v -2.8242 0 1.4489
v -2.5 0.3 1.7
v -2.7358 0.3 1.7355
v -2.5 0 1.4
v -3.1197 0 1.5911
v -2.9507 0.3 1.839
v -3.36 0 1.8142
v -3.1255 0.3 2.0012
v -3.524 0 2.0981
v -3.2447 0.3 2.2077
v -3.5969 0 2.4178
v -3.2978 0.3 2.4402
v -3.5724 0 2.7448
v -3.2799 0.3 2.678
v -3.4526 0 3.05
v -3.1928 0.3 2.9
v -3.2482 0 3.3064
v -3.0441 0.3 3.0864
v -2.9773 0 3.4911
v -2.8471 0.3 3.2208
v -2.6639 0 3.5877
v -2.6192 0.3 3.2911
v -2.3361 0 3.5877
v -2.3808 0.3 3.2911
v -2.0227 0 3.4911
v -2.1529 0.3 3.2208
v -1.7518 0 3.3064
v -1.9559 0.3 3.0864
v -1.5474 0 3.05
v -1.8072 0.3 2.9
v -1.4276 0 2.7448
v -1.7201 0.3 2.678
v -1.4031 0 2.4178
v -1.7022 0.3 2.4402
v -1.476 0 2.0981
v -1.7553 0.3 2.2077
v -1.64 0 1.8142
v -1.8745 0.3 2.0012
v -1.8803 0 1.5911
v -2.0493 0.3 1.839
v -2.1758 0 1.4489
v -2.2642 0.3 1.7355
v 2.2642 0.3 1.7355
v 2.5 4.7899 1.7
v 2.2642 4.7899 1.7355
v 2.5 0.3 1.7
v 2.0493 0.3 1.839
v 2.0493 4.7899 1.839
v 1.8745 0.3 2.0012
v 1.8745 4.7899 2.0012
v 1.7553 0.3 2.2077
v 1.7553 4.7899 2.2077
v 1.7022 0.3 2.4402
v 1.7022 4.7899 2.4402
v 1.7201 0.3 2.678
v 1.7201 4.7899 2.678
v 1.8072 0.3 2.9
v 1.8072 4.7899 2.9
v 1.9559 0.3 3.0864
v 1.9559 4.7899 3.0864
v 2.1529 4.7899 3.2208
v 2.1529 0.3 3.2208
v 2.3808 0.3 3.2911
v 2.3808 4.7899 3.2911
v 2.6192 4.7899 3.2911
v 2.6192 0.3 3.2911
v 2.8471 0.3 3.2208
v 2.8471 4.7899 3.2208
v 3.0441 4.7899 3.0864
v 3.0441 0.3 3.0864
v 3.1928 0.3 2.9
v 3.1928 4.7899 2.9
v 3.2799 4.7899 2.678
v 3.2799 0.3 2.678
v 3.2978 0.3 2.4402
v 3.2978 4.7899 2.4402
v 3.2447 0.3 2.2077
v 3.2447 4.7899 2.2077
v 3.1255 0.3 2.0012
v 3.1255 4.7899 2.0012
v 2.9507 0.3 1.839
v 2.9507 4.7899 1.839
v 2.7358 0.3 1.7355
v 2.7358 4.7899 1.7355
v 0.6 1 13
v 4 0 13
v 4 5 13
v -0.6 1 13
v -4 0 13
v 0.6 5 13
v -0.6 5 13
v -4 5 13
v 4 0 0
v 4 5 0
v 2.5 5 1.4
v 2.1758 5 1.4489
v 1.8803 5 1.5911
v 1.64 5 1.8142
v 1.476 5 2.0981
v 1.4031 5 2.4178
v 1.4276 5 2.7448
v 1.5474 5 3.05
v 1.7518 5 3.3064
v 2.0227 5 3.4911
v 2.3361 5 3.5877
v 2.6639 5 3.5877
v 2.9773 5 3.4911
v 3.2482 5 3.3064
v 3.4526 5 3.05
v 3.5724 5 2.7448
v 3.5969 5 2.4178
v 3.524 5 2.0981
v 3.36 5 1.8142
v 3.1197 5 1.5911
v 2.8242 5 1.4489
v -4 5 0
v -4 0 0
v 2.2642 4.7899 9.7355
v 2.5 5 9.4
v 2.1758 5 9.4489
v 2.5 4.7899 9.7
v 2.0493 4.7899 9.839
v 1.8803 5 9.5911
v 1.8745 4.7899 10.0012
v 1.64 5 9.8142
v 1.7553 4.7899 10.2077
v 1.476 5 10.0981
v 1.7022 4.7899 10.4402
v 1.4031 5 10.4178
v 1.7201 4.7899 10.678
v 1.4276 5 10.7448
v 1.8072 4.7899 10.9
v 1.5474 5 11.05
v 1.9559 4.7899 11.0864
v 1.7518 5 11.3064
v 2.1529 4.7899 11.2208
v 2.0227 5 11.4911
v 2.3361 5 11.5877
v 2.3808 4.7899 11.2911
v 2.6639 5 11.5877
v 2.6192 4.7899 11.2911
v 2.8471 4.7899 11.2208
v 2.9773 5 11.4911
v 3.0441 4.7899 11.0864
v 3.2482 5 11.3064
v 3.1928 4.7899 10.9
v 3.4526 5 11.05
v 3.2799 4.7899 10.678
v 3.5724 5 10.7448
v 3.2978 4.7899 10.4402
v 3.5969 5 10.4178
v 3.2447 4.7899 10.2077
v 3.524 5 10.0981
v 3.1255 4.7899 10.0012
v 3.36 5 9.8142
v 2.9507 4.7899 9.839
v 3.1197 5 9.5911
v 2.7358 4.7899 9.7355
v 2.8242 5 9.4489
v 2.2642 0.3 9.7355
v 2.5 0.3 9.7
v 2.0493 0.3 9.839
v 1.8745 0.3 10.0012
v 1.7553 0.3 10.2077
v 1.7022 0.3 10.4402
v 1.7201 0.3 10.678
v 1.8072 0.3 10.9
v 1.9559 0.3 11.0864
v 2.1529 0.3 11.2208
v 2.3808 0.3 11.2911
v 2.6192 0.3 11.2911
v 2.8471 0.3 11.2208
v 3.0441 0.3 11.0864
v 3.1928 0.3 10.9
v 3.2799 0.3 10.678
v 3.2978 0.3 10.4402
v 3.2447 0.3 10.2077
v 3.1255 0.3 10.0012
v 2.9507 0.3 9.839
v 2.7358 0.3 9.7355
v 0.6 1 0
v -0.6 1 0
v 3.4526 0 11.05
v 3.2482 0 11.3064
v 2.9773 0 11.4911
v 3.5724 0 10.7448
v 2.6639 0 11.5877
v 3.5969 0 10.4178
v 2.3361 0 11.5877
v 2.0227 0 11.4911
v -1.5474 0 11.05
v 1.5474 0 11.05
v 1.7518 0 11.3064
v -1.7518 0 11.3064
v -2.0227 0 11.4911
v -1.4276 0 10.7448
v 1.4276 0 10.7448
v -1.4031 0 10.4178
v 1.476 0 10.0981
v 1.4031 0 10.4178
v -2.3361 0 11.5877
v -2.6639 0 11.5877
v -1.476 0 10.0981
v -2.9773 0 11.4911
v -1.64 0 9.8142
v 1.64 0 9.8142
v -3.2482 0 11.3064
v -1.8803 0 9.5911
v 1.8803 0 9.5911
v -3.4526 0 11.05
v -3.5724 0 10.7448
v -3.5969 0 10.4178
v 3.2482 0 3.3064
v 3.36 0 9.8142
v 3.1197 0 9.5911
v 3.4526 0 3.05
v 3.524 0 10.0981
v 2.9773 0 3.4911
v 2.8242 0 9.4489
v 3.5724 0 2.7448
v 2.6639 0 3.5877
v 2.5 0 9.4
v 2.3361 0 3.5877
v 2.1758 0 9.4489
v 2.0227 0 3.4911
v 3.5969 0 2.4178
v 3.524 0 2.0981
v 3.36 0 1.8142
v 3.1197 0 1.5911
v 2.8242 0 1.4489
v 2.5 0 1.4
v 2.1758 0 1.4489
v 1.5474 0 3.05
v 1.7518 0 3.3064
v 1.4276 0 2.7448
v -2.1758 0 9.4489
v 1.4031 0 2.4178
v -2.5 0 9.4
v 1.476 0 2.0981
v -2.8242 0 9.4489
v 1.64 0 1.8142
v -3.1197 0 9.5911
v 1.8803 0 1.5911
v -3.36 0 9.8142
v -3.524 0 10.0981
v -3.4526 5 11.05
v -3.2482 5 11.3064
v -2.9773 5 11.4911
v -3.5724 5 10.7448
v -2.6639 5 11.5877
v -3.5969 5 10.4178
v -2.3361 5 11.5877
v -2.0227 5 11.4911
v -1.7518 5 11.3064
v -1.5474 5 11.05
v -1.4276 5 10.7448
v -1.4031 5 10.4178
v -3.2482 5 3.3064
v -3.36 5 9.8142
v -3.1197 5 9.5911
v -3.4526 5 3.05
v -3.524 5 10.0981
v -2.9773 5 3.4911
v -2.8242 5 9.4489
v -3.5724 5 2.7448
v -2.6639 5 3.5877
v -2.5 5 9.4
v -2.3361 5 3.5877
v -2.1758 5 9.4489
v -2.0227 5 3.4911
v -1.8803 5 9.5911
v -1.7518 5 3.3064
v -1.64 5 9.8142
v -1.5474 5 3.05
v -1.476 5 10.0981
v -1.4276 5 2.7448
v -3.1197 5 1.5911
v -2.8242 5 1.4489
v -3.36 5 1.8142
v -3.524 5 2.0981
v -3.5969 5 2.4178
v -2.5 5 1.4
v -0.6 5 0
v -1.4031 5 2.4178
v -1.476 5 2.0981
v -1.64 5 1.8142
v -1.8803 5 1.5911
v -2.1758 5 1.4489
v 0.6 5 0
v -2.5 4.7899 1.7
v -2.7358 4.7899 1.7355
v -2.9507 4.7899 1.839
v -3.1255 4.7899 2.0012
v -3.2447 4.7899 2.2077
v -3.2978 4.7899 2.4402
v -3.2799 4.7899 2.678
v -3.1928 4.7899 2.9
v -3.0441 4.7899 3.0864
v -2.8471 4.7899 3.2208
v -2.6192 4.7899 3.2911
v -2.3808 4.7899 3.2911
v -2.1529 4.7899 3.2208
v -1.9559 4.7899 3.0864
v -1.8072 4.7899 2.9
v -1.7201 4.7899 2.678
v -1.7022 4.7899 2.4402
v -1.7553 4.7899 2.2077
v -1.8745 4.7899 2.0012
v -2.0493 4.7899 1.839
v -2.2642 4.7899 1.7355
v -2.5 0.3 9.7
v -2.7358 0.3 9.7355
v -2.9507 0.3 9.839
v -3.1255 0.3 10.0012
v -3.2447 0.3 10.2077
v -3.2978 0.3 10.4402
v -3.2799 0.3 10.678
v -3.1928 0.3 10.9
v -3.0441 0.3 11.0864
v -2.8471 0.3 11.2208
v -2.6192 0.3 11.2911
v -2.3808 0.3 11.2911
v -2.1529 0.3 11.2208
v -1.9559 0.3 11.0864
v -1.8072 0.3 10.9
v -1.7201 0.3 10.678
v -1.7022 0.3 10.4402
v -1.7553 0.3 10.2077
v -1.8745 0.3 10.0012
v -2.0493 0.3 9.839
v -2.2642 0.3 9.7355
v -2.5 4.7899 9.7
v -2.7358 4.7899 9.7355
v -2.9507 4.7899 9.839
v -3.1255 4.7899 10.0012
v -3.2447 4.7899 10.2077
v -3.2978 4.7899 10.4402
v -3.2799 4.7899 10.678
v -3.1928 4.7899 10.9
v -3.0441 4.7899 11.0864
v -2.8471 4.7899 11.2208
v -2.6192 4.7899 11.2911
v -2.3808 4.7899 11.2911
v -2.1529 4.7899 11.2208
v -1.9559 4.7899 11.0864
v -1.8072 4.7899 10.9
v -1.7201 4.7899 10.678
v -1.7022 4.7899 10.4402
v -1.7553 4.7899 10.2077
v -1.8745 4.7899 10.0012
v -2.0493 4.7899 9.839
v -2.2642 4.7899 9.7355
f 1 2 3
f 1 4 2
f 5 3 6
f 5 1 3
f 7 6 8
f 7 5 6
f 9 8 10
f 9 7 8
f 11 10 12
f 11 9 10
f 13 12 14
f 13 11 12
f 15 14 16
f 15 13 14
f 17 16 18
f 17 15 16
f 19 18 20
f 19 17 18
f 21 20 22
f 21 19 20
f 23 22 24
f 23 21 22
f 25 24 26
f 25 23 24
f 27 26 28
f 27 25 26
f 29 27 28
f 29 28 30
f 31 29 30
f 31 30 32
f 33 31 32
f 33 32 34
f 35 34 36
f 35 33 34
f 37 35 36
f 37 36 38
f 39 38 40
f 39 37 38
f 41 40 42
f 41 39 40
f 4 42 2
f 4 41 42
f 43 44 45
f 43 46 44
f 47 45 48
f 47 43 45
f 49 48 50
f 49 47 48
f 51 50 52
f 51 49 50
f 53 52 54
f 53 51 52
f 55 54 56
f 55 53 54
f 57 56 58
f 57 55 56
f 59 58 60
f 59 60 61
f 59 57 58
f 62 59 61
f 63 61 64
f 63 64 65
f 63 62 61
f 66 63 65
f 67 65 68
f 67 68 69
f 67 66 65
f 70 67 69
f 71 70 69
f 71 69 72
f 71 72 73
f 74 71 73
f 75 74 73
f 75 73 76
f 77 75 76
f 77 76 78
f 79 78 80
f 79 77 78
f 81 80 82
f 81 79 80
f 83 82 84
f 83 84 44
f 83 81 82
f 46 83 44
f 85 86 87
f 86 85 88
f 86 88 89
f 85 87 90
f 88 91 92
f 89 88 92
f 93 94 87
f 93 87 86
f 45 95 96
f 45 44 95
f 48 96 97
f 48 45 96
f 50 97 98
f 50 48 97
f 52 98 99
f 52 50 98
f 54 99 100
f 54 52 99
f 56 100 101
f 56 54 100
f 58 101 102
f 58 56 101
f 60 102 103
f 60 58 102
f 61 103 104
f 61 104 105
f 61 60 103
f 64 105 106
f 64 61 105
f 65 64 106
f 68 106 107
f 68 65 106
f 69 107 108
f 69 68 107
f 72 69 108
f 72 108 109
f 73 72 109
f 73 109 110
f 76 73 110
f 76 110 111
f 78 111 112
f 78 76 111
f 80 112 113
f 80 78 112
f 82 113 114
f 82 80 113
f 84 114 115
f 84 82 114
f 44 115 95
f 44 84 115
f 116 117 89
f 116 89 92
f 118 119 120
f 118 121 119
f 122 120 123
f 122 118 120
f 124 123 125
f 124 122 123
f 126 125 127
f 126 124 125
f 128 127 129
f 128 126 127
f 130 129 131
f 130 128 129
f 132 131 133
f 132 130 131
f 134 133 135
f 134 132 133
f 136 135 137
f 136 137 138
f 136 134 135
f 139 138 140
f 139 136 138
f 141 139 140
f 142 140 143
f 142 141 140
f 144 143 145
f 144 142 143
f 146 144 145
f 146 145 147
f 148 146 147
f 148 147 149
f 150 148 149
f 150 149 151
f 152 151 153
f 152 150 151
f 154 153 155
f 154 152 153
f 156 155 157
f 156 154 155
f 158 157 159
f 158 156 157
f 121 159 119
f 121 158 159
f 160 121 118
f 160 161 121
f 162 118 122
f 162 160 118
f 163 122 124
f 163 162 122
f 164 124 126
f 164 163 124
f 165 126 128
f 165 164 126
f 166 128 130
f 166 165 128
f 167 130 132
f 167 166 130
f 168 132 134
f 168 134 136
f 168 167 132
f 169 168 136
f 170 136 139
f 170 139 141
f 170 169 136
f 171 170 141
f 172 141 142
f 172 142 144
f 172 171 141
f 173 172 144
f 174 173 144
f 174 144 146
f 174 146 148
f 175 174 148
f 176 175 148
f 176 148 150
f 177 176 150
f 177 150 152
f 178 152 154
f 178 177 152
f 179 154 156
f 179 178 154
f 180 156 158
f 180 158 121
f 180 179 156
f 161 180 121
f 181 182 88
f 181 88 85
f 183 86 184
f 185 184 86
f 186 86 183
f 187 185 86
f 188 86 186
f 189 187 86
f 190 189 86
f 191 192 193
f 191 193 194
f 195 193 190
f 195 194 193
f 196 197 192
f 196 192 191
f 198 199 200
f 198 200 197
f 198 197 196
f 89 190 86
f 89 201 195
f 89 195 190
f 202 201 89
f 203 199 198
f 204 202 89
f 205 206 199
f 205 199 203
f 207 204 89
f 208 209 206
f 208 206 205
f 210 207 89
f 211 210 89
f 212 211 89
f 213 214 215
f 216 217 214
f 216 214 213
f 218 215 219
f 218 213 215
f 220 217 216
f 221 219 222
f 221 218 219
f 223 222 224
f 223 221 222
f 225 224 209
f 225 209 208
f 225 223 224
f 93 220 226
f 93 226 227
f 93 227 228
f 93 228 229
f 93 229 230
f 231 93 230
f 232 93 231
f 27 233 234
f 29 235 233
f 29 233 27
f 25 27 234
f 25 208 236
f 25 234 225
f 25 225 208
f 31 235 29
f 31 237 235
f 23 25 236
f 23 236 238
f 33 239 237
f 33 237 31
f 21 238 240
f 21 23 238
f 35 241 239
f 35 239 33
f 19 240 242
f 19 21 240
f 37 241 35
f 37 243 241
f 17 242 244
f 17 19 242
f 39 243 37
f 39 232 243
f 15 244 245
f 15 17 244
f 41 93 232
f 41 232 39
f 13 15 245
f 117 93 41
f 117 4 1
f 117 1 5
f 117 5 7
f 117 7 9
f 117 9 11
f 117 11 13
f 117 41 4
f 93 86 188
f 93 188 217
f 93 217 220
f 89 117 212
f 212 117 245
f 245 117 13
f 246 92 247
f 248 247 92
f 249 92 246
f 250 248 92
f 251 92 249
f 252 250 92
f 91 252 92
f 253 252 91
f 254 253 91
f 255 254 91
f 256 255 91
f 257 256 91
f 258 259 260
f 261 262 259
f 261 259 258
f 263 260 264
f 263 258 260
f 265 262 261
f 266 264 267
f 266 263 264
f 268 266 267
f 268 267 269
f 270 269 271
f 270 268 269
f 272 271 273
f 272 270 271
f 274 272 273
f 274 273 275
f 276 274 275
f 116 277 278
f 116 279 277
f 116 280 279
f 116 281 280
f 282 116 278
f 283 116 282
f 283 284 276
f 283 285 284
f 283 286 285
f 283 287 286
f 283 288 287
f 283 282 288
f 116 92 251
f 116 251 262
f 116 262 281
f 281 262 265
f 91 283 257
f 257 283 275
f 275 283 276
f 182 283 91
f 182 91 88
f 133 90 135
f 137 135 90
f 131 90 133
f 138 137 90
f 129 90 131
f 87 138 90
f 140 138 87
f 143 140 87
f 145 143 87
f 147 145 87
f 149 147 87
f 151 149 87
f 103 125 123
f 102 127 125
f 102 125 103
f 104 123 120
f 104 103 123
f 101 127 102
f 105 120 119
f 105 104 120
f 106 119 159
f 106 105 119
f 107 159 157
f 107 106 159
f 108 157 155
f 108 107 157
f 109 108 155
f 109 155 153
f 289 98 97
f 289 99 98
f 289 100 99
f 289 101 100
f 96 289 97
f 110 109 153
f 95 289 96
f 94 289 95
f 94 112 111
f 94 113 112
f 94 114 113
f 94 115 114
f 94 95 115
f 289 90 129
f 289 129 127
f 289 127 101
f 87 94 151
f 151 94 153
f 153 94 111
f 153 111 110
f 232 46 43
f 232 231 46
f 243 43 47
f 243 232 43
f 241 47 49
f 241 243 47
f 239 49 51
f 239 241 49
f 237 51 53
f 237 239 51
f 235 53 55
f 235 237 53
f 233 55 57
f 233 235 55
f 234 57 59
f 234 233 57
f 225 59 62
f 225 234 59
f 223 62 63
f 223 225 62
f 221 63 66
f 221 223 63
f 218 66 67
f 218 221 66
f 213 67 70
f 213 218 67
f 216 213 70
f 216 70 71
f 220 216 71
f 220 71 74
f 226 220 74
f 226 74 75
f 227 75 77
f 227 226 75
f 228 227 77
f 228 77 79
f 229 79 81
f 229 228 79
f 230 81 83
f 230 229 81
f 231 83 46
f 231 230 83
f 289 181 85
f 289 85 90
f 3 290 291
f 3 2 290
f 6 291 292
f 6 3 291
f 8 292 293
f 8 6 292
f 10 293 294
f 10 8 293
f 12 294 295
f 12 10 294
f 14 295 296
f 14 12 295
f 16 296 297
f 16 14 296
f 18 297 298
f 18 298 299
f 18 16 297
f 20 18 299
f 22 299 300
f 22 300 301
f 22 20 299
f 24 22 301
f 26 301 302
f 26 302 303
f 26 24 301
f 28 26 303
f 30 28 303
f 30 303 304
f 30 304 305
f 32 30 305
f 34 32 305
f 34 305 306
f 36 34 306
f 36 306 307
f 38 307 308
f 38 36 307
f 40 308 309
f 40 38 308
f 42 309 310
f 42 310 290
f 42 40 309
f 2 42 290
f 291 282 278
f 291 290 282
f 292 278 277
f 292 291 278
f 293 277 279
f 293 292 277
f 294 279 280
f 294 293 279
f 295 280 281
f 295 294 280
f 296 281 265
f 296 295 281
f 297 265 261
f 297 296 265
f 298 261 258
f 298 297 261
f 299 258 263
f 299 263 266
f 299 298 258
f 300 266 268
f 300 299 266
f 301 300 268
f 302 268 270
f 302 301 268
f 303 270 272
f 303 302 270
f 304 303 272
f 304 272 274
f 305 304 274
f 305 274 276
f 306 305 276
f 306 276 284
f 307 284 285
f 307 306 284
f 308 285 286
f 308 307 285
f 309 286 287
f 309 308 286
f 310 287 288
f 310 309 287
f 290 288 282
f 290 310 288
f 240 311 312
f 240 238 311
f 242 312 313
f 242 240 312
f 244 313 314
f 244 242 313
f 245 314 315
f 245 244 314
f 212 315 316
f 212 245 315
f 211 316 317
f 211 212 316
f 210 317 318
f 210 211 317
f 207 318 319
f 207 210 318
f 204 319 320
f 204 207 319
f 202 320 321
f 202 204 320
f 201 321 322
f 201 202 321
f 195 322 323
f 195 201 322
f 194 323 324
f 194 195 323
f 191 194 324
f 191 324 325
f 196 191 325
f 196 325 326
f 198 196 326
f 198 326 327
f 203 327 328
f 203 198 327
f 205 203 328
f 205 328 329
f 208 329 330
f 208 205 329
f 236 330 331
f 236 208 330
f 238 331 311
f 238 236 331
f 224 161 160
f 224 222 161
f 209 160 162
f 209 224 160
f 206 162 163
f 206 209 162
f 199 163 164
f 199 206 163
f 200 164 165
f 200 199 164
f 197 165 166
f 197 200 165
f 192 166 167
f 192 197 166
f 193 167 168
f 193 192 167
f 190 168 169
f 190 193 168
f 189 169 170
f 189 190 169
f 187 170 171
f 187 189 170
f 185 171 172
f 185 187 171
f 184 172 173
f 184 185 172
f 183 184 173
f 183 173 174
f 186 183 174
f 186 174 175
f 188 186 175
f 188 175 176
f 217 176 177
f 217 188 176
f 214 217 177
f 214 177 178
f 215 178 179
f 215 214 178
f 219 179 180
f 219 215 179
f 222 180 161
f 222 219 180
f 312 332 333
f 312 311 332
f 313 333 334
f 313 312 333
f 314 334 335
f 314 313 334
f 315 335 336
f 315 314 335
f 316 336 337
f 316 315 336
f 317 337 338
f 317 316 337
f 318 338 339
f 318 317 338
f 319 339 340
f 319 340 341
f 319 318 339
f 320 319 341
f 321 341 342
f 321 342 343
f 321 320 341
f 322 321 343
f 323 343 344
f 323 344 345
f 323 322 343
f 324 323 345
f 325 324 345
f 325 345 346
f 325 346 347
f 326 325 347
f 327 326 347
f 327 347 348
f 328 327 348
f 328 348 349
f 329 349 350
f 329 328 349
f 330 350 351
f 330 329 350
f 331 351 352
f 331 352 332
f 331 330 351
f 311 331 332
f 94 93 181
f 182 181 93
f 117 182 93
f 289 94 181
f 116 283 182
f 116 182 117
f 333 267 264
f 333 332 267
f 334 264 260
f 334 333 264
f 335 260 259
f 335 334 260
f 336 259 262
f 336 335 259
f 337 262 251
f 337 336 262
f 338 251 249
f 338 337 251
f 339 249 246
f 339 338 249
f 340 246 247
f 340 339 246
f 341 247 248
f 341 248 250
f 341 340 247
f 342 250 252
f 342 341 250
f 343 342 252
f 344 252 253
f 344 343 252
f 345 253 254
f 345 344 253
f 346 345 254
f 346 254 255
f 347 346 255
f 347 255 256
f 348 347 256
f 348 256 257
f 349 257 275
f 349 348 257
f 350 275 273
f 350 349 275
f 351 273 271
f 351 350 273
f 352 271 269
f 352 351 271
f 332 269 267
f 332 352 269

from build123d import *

# Parameters (mm, degrees)
EXTRUDE_1_DEPTH    = 13
M2X0_41_AT_2_COUNT = 2
M2X0_41_AT_2_PITCH = 5
M2X0_41_AT_3_COUNT = 2
M2X0_41_AT_3_PITCH = 9.433981132
M2X0_41_AT_4_COUNT = 2
M2X0_41_AT_4_PITCH = 8


with BuildPart() as part:
    # Эскиз1 → Бобышка-Вытянуть1 (new body)
    with BuildSketch(Plane.XY):
        Polygon((-4, 5), (-0.6, 5), (-0.6, 1), (0.6, 1), (0.6, 5), (4, 5), (4, 0), (-4, 0), align=None)
    extrude(amount=EXTRUDE_1_DEPTH)

    # Эскиз2 → Отверстие обработанное метчиком M2x0.41 (revolve, cut)
    with BuildSketch(Plane(origin=(-2.5, 0, 10.5), x_dir=(0, 0, -1), z_dir=(1, 0, 0))):
        Polygon((0, 0), (0, 5), (1.1, 5), (0.8, 4.789937739), (0.8, 0.3), (1.1, 0), align=None)
    m2x0_41 = revolve(axis=Axis((-2.5, -6.35, 10.5), (0, 1, 0)), mode=Mode.SUBTRACT)

    # Отверстие обработанное метчиком M2x0.41 at 2: Отверстие обработанное метчиком M2x0.41 ×2
    with Locations(*[(i * M2X0_41_AT_2_PITCH, 0, 0) for i in range(1, M2X0_41_AT_2_COUNT)]):
        add(m2x0_41, mode=Mode.SUBTRACT)

    # Отверстие обработанное метчиком M2x0.41 at 3: Отверстие обработанное метчиком M2x0.41 ×2
    with Locations(*[Vector(0.52999894, 0, -0.847998304) * (i * M2X0_41_AT_3_PITCH) for i in range(1, M2X0_41_AT_3_COUNT)]):
        add(m2x0_41, mode=Mode.SUBTRACT)

    # Отверстие обработанное метчиком M2x0.41 at 4: Отверстие обработанное метчиком M2x0.41 ×2
    with Locations(*[(0, 0, -i * M2X0_41_AT_4_PITCH) for i in range(1, M2X0_41_AT_4_COUNT)]):
        add(m2x0_41, mode=Mode.SUBTRACT)


solid = part.part
